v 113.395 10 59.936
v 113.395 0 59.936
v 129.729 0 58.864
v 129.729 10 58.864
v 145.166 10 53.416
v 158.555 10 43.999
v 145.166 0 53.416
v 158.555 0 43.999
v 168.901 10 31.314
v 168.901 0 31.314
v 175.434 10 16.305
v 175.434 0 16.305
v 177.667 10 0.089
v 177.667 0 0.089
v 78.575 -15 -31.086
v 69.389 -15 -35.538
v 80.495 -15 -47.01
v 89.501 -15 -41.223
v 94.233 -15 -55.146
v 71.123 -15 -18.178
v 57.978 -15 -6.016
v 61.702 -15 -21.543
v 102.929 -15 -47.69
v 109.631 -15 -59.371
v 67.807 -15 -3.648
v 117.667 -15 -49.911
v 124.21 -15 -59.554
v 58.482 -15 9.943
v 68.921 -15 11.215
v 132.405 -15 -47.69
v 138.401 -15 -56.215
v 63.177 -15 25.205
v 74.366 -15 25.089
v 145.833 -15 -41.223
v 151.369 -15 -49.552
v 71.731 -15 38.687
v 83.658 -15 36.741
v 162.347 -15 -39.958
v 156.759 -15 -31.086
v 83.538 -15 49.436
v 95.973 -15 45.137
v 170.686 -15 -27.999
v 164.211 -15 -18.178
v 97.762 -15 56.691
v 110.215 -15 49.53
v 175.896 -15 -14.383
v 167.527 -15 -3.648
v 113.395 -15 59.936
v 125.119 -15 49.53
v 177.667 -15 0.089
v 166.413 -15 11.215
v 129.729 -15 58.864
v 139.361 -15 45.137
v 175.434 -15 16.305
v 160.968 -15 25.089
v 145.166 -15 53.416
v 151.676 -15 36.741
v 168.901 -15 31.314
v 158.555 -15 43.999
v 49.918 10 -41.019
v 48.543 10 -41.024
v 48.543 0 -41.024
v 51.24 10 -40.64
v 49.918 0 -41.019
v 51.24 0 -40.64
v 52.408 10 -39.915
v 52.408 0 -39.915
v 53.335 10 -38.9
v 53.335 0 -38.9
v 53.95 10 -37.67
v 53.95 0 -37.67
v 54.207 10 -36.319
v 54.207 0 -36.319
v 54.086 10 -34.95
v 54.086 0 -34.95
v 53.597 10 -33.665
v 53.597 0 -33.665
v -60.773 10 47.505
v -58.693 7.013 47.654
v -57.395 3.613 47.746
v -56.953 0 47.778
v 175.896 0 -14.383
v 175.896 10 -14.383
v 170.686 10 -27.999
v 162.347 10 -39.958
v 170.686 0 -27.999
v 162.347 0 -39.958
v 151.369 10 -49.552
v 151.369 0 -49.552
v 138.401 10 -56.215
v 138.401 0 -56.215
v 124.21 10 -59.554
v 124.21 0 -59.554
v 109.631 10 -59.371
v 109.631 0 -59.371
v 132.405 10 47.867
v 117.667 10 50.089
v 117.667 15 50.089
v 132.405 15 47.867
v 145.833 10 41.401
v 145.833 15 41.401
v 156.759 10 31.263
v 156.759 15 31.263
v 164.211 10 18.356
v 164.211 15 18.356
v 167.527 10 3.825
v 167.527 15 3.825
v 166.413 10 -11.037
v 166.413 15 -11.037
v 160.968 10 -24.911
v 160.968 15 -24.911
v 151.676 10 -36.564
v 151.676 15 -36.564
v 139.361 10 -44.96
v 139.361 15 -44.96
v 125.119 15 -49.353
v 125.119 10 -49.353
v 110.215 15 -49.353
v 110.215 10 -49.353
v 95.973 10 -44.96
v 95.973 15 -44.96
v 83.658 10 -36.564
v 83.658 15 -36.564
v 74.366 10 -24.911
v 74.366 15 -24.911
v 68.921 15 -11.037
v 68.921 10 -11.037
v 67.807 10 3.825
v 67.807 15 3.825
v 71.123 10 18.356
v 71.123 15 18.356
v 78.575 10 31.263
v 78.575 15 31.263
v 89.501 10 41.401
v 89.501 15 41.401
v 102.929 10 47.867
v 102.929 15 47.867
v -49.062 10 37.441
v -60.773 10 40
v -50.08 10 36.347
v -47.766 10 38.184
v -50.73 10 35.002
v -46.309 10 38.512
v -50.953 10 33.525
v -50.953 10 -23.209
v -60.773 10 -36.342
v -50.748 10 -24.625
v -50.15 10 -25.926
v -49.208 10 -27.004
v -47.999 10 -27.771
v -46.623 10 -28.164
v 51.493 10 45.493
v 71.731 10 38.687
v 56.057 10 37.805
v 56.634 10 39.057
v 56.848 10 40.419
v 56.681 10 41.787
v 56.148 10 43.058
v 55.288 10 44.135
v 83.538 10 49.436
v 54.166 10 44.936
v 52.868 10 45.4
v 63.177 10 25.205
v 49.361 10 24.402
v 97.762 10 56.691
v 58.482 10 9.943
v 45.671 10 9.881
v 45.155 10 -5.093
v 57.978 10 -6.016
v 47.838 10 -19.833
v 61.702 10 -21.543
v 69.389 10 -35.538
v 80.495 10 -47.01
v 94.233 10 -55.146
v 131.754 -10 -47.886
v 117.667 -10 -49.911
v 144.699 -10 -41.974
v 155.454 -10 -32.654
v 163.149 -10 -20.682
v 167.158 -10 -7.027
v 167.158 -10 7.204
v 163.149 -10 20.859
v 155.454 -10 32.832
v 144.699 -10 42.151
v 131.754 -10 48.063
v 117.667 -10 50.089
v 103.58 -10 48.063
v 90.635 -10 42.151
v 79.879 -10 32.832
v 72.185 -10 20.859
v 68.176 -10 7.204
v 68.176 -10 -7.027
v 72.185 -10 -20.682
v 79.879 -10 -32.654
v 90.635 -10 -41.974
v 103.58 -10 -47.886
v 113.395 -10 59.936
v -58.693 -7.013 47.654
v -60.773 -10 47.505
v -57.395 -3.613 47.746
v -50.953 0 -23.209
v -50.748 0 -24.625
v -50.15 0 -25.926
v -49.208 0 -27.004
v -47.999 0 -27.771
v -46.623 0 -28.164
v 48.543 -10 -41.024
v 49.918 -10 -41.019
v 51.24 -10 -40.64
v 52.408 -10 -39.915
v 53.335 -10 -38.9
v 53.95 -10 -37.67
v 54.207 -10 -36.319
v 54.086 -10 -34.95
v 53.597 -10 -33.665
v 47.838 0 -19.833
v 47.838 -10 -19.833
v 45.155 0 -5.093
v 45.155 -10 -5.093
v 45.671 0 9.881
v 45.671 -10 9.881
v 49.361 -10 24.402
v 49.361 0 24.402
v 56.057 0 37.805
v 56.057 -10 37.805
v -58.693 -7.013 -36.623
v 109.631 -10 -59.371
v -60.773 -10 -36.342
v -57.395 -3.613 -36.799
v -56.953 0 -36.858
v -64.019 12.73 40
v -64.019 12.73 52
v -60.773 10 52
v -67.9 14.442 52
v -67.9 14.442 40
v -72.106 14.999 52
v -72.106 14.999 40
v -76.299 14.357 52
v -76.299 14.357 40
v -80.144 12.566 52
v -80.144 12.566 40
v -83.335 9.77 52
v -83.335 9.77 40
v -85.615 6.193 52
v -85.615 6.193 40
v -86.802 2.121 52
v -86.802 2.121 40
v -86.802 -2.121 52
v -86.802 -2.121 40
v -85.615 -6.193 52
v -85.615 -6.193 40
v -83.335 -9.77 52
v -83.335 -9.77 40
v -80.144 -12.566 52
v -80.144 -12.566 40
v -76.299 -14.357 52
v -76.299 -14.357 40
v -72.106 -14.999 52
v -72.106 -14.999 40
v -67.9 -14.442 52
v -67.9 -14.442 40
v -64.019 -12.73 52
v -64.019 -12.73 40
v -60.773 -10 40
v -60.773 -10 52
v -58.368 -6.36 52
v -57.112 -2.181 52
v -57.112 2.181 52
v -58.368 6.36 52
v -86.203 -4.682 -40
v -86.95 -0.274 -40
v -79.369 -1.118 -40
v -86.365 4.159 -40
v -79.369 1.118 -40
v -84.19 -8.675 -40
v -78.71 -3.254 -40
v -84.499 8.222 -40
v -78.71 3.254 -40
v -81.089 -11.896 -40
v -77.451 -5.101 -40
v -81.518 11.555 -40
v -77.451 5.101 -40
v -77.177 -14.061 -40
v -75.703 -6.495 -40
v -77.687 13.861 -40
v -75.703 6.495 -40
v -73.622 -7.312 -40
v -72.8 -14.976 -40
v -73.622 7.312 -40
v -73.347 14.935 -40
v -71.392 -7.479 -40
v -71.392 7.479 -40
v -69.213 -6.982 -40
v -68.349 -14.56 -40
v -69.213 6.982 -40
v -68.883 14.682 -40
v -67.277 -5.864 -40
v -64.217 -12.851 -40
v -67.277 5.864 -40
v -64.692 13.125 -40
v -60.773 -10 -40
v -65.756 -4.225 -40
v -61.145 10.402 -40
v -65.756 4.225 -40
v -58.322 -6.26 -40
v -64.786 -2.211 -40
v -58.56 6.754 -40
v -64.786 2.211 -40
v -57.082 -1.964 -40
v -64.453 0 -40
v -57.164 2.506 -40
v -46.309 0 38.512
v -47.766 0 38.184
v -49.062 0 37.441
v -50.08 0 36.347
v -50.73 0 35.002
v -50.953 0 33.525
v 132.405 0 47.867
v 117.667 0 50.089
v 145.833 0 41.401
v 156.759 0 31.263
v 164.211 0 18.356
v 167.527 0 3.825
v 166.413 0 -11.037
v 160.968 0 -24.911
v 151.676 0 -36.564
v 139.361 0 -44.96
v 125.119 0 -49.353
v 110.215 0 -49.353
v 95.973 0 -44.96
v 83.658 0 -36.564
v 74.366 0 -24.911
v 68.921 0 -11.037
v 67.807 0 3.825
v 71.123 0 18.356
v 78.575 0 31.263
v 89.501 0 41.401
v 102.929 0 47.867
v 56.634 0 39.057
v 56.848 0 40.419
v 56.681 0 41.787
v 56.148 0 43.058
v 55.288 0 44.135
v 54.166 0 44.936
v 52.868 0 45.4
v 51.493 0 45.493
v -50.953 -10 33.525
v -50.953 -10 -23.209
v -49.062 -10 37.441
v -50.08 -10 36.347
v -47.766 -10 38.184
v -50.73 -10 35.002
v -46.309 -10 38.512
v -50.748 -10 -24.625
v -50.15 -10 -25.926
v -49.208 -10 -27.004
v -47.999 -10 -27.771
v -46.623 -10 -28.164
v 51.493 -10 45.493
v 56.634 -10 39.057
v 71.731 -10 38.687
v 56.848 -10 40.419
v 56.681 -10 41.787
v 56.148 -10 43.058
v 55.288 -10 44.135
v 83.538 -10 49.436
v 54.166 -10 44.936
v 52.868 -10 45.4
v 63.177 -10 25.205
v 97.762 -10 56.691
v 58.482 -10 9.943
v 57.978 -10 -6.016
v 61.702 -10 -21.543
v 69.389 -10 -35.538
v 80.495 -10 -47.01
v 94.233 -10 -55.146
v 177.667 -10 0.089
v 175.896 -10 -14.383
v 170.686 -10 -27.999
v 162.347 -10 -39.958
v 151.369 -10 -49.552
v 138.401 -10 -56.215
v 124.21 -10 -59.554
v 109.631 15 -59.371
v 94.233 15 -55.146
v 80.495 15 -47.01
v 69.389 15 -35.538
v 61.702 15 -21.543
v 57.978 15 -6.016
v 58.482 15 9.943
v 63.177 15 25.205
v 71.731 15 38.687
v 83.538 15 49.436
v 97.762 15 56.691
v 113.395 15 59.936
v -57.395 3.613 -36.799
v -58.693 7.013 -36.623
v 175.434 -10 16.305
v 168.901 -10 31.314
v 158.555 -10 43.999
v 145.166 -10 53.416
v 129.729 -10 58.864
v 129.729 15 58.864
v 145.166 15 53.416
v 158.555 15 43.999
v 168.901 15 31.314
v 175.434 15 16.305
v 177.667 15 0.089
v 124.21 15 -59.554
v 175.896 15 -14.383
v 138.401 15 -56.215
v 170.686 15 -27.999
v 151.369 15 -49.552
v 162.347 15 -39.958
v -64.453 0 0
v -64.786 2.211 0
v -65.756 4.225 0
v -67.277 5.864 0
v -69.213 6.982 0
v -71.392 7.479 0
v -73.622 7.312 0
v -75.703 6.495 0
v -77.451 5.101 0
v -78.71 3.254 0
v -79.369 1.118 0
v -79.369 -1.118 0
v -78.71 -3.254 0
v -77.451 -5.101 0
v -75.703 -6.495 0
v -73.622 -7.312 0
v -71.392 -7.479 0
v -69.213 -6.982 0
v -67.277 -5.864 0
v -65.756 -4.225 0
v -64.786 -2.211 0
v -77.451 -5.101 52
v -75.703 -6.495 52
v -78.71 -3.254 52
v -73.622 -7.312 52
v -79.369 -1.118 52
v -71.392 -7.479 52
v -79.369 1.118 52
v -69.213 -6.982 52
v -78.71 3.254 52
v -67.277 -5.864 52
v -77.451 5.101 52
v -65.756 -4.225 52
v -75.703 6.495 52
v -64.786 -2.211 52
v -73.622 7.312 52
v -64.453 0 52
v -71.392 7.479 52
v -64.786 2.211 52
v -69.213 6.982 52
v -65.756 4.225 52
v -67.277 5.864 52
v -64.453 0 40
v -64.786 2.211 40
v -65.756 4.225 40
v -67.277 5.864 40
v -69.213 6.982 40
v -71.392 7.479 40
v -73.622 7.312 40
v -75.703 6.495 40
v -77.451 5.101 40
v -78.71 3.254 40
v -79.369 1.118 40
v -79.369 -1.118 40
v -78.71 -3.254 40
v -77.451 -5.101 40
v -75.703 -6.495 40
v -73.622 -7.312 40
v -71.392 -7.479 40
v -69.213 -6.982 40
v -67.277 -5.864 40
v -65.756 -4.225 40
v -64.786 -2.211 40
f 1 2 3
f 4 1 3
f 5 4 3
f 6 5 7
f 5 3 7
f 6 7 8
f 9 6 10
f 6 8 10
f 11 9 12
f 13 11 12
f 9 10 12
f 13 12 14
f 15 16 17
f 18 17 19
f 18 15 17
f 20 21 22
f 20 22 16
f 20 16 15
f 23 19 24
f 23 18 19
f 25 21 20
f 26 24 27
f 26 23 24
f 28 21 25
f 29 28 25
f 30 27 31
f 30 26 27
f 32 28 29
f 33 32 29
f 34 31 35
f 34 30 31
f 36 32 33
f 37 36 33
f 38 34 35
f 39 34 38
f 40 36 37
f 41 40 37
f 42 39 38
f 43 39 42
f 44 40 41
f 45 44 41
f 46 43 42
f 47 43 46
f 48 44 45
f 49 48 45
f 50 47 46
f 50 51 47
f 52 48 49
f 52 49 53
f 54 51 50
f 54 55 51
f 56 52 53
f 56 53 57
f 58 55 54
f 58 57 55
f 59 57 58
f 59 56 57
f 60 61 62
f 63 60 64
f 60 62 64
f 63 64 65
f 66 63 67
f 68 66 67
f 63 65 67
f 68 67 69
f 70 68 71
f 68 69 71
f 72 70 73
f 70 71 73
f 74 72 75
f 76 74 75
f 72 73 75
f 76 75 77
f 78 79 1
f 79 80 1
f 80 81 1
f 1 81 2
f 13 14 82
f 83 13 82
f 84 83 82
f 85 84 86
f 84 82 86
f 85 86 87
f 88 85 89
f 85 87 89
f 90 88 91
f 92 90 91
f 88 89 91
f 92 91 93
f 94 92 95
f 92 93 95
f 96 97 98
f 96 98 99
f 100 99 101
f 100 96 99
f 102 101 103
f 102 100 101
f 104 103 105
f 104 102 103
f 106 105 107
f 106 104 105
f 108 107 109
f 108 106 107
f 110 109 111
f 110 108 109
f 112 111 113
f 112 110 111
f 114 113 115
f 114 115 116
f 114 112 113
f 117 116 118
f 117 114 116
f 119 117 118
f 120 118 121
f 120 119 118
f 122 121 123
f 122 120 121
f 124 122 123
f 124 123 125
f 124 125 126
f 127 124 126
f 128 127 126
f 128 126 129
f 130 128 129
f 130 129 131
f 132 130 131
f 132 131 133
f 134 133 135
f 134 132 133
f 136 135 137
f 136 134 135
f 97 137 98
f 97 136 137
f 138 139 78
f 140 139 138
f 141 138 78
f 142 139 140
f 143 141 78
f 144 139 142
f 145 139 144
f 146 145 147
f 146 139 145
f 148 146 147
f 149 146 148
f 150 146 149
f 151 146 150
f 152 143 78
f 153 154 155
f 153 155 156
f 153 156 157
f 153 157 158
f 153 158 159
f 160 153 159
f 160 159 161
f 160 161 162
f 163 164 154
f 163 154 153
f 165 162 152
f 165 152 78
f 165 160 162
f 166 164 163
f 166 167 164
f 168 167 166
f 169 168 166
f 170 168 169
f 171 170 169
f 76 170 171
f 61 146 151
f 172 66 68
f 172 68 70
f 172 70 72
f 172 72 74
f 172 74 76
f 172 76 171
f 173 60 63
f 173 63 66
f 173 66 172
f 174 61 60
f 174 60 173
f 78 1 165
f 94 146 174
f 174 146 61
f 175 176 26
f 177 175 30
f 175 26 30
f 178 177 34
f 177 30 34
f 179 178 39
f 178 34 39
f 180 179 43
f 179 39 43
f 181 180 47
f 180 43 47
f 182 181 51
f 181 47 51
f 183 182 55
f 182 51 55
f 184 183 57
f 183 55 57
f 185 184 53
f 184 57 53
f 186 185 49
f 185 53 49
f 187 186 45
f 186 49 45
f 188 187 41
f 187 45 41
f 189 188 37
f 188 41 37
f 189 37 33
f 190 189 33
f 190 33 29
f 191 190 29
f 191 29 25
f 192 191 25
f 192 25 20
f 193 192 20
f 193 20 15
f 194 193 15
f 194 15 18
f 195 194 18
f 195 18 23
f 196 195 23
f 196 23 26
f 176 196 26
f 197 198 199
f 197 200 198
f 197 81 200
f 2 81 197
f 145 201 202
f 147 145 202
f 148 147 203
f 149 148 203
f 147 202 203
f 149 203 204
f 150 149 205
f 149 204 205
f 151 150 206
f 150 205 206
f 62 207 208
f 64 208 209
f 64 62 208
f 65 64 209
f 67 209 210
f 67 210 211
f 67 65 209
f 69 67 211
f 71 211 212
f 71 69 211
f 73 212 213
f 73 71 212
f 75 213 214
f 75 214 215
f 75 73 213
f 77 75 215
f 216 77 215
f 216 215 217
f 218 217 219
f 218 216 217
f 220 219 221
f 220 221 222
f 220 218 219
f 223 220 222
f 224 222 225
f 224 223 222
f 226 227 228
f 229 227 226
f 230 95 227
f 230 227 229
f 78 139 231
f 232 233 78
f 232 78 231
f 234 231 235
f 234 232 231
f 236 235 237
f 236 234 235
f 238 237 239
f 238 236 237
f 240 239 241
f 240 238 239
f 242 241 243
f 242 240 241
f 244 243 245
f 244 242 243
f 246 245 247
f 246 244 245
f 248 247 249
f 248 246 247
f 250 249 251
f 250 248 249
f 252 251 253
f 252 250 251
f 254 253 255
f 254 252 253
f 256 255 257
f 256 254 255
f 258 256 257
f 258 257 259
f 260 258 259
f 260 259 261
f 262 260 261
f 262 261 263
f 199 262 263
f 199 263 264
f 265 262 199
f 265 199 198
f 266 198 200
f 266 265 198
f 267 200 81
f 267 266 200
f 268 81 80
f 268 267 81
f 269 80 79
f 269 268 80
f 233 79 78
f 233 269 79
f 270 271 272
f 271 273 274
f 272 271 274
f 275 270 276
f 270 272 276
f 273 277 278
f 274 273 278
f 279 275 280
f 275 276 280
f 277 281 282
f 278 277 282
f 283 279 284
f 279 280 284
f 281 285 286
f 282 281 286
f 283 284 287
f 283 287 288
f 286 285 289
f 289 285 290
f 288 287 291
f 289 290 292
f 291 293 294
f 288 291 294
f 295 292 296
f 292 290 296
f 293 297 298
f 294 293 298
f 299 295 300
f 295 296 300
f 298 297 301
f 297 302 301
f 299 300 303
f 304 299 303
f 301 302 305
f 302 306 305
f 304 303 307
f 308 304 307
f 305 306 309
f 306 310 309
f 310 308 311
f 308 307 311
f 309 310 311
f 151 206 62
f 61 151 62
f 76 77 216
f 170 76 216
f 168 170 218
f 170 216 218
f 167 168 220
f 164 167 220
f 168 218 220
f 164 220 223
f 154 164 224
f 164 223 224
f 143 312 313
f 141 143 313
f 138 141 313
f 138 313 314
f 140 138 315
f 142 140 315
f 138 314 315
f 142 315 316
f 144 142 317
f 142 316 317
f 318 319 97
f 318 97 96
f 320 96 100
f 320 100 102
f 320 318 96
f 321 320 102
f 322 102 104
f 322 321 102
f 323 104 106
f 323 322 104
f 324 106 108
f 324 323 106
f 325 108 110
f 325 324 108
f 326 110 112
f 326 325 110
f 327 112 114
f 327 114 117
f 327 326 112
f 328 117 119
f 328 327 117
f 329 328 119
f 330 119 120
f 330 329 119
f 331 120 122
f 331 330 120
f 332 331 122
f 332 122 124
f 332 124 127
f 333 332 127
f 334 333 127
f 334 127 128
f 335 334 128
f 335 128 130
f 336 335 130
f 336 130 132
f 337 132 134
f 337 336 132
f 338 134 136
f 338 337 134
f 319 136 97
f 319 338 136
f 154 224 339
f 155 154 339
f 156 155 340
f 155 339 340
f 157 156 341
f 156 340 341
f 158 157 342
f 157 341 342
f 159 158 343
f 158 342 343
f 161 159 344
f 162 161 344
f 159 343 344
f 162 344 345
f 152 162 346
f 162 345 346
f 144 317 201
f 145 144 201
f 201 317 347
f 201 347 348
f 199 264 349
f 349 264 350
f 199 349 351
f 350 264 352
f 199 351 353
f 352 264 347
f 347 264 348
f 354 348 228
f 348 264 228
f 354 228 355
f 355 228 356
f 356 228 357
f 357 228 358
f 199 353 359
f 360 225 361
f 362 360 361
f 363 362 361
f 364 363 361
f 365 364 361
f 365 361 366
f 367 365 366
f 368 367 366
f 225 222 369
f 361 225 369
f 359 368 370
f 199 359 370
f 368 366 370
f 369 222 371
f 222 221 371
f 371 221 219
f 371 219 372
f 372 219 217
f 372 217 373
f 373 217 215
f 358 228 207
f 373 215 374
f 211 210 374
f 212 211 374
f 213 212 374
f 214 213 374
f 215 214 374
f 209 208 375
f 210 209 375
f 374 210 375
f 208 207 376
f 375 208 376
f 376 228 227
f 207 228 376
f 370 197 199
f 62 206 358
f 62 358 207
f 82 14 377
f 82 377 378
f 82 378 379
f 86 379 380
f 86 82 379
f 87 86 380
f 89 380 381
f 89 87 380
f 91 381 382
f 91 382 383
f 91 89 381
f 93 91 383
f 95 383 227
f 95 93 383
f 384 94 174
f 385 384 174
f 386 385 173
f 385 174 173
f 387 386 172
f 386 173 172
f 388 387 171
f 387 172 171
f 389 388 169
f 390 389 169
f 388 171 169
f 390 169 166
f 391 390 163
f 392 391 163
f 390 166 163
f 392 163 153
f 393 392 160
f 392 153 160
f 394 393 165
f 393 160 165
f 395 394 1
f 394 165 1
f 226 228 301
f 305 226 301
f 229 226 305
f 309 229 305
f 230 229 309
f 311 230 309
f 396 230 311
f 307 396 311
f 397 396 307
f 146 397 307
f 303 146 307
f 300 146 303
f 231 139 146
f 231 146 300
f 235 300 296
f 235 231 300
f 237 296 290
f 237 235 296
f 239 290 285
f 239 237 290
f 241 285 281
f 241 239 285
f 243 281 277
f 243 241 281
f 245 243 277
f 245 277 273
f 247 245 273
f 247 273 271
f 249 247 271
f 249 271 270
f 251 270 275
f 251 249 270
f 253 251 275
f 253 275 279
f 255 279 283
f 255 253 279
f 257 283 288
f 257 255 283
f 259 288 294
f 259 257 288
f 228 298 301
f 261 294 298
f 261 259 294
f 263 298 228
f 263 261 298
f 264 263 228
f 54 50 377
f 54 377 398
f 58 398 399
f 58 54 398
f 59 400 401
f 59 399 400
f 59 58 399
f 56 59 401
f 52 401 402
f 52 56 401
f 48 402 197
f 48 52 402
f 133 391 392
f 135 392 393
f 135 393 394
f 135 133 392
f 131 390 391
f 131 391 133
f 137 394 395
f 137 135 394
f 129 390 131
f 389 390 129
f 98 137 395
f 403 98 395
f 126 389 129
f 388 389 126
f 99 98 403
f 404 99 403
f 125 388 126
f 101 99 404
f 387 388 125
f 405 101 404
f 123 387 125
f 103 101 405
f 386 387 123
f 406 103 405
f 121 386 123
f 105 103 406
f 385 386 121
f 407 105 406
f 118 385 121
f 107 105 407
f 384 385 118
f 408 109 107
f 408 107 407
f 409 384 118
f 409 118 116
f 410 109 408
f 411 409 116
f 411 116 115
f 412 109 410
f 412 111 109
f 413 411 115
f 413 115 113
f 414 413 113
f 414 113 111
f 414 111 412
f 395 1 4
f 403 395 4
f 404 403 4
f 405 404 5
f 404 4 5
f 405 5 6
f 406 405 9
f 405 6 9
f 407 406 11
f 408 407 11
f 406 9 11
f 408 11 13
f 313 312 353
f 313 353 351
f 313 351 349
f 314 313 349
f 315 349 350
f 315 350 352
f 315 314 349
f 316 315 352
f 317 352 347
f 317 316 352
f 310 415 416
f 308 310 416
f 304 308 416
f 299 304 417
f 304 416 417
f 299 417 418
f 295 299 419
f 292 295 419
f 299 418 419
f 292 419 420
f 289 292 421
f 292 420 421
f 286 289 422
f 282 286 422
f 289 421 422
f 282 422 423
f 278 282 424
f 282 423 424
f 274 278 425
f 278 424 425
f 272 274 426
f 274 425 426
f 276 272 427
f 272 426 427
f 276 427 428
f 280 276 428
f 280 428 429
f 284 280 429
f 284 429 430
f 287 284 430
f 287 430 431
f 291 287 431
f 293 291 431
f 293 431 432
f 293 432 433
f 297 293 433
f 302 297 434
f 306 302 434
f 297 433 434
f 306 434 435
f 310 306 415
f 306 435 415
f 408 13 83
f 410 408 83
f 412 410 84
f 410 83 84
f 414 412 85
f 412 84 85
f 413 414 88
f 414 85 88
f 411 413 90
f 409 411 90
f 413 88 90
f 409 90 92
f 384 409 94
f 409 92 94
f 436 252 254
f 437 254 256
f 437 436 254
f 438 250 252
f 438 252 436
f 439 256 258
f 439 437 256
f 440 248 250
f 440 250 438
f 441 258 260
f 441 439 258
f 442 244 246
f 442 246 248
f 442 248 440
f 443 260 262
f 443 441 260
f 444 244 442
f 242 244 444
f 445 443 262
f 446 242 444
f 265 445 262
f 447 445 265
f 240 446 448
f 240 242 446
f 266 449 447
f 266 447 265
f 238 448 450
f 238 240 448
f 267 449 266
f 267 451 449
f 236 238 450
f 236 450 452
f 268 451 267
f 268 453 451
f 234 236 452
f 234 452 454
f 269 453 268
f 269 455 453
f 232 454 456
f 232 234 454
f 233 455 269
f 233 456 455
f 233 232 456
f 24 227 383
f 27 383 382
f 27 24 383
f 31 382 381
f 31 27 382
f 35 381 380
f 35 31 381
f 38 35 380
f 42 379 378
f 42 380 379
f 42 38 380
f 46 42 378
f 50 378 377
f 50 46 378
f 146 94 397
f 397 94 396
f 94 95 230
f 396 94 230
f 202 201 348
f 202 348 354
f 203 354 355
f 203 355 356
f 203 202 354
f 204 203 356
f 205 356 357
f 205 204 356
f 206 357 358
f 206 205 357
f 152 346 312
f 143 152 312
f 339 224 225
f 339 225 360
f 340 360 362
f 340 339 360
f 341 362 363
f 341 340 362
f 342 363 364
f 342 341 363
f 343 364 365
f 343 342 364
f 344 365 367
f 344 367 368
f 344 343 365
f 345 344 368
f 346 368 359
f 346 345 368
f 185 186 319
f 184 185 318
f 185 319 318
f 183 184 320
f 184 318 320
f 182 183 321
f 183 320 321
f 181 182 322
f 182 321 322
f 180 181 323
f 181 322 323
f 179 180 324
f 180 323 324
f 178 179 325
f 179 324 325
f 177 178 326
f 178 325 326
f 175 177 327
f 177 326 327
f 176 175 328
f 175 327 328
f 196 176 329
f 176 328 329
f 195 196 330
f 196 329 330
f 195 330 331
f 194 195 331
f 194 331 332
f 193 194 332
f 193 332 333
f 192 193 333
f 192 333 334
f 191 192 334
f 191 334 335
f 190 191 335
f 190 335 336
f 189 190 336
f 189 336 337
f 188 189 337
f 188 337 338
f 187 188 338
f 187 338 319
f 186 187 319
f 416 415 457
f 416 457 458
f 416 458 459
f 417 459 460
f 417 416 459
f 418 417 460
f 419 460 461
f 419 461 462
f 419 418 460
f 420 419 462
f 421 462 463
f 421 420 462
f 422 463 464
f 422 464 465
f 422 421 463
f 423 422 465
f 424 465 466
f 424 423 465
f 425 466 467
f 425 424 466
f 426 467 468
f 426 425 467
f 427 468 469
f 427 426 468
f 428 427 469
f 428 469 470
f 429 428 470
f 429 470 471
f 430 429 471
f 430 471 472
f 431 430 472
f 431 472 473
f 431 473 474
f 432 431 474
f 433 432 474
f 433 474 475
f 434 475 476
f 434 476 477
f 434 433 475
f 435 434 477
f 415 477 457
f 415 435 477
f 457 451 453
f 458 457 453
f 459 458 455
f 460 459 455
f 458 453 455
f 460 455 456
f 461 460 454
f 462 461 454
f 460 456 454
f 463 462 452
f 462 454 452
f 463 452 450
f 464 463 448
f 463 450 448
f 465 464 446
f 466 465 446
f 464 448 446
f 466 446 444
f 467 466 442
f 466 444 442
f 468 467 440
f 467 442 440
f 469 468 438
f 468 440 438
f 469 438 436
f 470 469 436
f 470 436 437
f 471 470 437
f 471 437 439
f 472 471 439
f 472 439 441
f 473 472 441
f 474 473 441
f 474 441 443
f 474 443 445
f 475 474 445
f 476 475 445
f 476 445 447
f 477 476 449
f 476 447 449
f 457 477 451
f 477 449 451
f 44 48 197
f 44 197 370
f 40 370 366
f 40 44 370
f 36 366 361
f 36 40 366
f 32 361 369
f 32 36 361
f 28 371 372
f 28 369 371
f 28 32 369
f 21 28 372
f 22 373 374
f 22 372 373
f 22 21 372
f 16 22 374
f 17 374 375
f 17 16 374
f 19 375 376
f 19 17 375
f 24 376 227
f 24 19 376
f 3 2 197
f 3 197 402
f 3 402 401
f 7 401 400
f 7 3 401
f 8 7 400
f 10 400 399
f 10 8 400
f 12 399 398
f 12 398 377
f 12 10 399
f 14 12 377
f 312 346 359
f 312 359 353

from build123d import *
from build123d.topology import SkipClean

# Parameters (mm, degrees)
SKETCH1_R           = 50
BOSS_EXTRUDE4_DEPTH = 10
SKETCH4_R           = 50
BOSS_EXTRUDE5_DEPTH = 5
BOSS_EXTRUDE6_START = 5
SKETCH5_R           = 50
BOSS_EXTRUDE6_DEPTH = 5
SKETCH9_R           = 15
SKETCH9_R_2         = 7.5
BOSS_EXTRUDE8_DEPTH = 40
CUT_EXTRUDE1_START  = 50
SKETCH11_R          = 15
CUT_EXTRUDE1_DEPTH  = 50
BOSS_EXTRUDE9_START = 12
SKETCH12_R          = 7.5
BOSS_EXTRUDE9_DEPTH = 12


with BuildPart() as part:
    # Sketch1 → Boss-Extrude4 (new, symmetric)
    # profile 1 of 2: a face of its own
    with BuildSketch(Plane(origin=(0, 0, 0), x_dir=(1, 0, 0), z_dir=(0, 1, 0))):
        with BuildLine():
            Line((109.631487436, 59.370873009), (-60.952961118, 36.317806))
            Line((-60.952961118, 36.317806), (-60.952961118, -47.492515538))
            Line((-60.952961118, -47.492515538), (113.395395748, -59.936377162))
            ThreePointArc((113.395395748, -59.936377162), (57.696778774, -1.980561591), (109.631487436, 59.370873009))
        make_face()
        with BuildLine():
            Line((-46.622582391, 28.163534109), (48.543183, 41.024394434))
            ThreePointArc((48.543183, 41.024394434), (53.334657365, 38.899688702), (53.596610708, 33.664807473))
            ThreePointArc((53.596610708, 33.664807473), (45.011329084, -2.407953952), (56.056582269, -37.805038006))
            ThreePointArc((56.056582269, -37.805038006), (56.147884391, -43.057885165), (51.492525841, -45.492710855))
            Line((51.492525841, -45.492710855), (-46.308923365, -38.512273973))
            ThreePointArc((-46.308923365, -38.512273973), (-49.612183114, -36.932319839), (-50.952961118, -33.524960981))
            Line((-50.952961118, -33.524960981), (-50.952961118, 23.208576253))
            ThreePointArc((-50.952961118, 23.208576253), (-49.717805495, 26.498856913), (-46.622582391, 28.163534109))
        make_face(mode=Mode.SUBTRACT)
    # profile 2 of 2: a face of its own
    with BuildSketch(Plane(origin=(0, 0, 0), x_dir=(1, 0, 0), z_dir=(0, 1, 0))):
        with BuildLine():
            ThreePointArc((177.666942704, -0.088621259), (157.15031062, 45.089511261), (109.631487436, 59.370873009))
            ThreePointArc((109.631487436, 59.370873009), (57.696778774, -1.980561591), (113.395395748, -59.936377162))
            ThreePointArc((113.395395748, -59.936377162), (158.555248995, -43.999285211), (177.666942704, -0.088621259))
        make_face()
        with Locations(Location((117.666942704, -0.088621259, 0), (0, 0, 270))):
            Circle(SKETCH1_R, mode=Mode.SUBTRACT)
    extrude(amount=BOSS_EXTRUDE4_DEPTH, both=True)

    # Sketch4 → Boss-Extrude5 (add)
    with BuildSketch(Plane(origin=(0, 10, 0), x_dir=(1, 0, 0), z_dir=(0, 1, 0))):
        with BuildLine():
            ThreePointArc((109.631487436, 59.370873009), (57.696778774, -1.980561591), (113.395395748, -59.936377162))
            ThreePointArc((113.395395748, -59.936377162), (158.555248995, -43.999285211), (177.666942704, -0.088621259))
            ThreePointArc((177.666942704, -0.088621259), (157.15031062, 45.089511261), (109.631487436, 59.370873009))
        make_face()
        with Locations(Location((117.666942704, -0.088621259, 0), (0, 0, 270))):
            Circle(SKETCH4_R, mode=Mode.SUBTRACT)
    extrude(amount=BOSS_EXTRUDE5_DEPTH)

    # Sketch5 → Boss-Extrude6 (add)
    with BuildSketch(Plane.XZ.offset(10).offset(BOSS_EXTRUDE6_START)):
        with BuildLine():
            ThreePointArc((113.395395748, 59.936377162), (57.696778774, 1.980561591), (109.631487436, -59.370873009))
            ThreePointArc((109.631487436, -59.370873009), (157.15031062, -45.089511261), (177.666942704, 0.088621259))
            ThreePointArc((177.666942704, 0.088621259), (158.555248995, 43.999285211), (113.395395748, 59.936377162))
        make_face()
        with Locations(Location((117.666942704, 0.088621259, 0), (0, 0, 270))):
            Circle(SKETCH5_R, mode=Mode.SUBTRACT)
    extrude(amount=-BOSS_EXTRUDE6_DEPTH)

    # Sketch9 → Boss-Extrude8 (add, symmetric)
    with SkipClean():  # the faces are left unmerged after this step: merging them gives an invalid solid
        with BuildSketch(Plane.XY):
            with Locations(Location((-71.952961118, 0, 0), (0, 0, 318.189685104))):
                Circle(SKETCH9_R)
            with Locations((-71.952961118, 0)):
                Circle(SKETCH9_R_2, mode=Mode.SUBTRACT)
        extrude(amount=BOSS_EXTRUDE8_DEPTH, both=True)

    # Sketch11 → Cut-Extrude1 (cut)
    with SkipClean():  # the faces are left unmerged after this step: merging them gives an invalid solid
        with BuildSketch(Plane.XY.offset(40).offset(CUT_EXTRUDE1_START)):
            with Locations(Location((-71.952961118, 0, 0), (0, 0, 318.189685104))):
                Circle(SKETCH11_R)
        extrude(amount=-CUT_EXTRUDE1_DEPTH, mode=Mode.SUBTRACT)

    # Sketch12 → Boss-Extrude9 (add)
    with SkipClean():  # the faces are left unmerged after this step: merging them gives an invalid solid
        with BuildSketch(Plane.XY.offset(40).offset(BOSS_EXTRUDE9_START)):
            with BuildLine():
                ThreePointArc((-60.772621231, 10), (-86.952961118, 0), (-60.772621231, -10))
                ThreePointArc((-60.772621231, -10), (-56.952961118, 0), (-60.772621231, 10))
            make_face()
            with Locations((-71.952961118, 0)):
                Circle(SKETCH12_R, mode=Mode.SUBTRACT)
        extrude(amount=-BOSS_EXTRUDE9_DEPTH)


solid = part.part
